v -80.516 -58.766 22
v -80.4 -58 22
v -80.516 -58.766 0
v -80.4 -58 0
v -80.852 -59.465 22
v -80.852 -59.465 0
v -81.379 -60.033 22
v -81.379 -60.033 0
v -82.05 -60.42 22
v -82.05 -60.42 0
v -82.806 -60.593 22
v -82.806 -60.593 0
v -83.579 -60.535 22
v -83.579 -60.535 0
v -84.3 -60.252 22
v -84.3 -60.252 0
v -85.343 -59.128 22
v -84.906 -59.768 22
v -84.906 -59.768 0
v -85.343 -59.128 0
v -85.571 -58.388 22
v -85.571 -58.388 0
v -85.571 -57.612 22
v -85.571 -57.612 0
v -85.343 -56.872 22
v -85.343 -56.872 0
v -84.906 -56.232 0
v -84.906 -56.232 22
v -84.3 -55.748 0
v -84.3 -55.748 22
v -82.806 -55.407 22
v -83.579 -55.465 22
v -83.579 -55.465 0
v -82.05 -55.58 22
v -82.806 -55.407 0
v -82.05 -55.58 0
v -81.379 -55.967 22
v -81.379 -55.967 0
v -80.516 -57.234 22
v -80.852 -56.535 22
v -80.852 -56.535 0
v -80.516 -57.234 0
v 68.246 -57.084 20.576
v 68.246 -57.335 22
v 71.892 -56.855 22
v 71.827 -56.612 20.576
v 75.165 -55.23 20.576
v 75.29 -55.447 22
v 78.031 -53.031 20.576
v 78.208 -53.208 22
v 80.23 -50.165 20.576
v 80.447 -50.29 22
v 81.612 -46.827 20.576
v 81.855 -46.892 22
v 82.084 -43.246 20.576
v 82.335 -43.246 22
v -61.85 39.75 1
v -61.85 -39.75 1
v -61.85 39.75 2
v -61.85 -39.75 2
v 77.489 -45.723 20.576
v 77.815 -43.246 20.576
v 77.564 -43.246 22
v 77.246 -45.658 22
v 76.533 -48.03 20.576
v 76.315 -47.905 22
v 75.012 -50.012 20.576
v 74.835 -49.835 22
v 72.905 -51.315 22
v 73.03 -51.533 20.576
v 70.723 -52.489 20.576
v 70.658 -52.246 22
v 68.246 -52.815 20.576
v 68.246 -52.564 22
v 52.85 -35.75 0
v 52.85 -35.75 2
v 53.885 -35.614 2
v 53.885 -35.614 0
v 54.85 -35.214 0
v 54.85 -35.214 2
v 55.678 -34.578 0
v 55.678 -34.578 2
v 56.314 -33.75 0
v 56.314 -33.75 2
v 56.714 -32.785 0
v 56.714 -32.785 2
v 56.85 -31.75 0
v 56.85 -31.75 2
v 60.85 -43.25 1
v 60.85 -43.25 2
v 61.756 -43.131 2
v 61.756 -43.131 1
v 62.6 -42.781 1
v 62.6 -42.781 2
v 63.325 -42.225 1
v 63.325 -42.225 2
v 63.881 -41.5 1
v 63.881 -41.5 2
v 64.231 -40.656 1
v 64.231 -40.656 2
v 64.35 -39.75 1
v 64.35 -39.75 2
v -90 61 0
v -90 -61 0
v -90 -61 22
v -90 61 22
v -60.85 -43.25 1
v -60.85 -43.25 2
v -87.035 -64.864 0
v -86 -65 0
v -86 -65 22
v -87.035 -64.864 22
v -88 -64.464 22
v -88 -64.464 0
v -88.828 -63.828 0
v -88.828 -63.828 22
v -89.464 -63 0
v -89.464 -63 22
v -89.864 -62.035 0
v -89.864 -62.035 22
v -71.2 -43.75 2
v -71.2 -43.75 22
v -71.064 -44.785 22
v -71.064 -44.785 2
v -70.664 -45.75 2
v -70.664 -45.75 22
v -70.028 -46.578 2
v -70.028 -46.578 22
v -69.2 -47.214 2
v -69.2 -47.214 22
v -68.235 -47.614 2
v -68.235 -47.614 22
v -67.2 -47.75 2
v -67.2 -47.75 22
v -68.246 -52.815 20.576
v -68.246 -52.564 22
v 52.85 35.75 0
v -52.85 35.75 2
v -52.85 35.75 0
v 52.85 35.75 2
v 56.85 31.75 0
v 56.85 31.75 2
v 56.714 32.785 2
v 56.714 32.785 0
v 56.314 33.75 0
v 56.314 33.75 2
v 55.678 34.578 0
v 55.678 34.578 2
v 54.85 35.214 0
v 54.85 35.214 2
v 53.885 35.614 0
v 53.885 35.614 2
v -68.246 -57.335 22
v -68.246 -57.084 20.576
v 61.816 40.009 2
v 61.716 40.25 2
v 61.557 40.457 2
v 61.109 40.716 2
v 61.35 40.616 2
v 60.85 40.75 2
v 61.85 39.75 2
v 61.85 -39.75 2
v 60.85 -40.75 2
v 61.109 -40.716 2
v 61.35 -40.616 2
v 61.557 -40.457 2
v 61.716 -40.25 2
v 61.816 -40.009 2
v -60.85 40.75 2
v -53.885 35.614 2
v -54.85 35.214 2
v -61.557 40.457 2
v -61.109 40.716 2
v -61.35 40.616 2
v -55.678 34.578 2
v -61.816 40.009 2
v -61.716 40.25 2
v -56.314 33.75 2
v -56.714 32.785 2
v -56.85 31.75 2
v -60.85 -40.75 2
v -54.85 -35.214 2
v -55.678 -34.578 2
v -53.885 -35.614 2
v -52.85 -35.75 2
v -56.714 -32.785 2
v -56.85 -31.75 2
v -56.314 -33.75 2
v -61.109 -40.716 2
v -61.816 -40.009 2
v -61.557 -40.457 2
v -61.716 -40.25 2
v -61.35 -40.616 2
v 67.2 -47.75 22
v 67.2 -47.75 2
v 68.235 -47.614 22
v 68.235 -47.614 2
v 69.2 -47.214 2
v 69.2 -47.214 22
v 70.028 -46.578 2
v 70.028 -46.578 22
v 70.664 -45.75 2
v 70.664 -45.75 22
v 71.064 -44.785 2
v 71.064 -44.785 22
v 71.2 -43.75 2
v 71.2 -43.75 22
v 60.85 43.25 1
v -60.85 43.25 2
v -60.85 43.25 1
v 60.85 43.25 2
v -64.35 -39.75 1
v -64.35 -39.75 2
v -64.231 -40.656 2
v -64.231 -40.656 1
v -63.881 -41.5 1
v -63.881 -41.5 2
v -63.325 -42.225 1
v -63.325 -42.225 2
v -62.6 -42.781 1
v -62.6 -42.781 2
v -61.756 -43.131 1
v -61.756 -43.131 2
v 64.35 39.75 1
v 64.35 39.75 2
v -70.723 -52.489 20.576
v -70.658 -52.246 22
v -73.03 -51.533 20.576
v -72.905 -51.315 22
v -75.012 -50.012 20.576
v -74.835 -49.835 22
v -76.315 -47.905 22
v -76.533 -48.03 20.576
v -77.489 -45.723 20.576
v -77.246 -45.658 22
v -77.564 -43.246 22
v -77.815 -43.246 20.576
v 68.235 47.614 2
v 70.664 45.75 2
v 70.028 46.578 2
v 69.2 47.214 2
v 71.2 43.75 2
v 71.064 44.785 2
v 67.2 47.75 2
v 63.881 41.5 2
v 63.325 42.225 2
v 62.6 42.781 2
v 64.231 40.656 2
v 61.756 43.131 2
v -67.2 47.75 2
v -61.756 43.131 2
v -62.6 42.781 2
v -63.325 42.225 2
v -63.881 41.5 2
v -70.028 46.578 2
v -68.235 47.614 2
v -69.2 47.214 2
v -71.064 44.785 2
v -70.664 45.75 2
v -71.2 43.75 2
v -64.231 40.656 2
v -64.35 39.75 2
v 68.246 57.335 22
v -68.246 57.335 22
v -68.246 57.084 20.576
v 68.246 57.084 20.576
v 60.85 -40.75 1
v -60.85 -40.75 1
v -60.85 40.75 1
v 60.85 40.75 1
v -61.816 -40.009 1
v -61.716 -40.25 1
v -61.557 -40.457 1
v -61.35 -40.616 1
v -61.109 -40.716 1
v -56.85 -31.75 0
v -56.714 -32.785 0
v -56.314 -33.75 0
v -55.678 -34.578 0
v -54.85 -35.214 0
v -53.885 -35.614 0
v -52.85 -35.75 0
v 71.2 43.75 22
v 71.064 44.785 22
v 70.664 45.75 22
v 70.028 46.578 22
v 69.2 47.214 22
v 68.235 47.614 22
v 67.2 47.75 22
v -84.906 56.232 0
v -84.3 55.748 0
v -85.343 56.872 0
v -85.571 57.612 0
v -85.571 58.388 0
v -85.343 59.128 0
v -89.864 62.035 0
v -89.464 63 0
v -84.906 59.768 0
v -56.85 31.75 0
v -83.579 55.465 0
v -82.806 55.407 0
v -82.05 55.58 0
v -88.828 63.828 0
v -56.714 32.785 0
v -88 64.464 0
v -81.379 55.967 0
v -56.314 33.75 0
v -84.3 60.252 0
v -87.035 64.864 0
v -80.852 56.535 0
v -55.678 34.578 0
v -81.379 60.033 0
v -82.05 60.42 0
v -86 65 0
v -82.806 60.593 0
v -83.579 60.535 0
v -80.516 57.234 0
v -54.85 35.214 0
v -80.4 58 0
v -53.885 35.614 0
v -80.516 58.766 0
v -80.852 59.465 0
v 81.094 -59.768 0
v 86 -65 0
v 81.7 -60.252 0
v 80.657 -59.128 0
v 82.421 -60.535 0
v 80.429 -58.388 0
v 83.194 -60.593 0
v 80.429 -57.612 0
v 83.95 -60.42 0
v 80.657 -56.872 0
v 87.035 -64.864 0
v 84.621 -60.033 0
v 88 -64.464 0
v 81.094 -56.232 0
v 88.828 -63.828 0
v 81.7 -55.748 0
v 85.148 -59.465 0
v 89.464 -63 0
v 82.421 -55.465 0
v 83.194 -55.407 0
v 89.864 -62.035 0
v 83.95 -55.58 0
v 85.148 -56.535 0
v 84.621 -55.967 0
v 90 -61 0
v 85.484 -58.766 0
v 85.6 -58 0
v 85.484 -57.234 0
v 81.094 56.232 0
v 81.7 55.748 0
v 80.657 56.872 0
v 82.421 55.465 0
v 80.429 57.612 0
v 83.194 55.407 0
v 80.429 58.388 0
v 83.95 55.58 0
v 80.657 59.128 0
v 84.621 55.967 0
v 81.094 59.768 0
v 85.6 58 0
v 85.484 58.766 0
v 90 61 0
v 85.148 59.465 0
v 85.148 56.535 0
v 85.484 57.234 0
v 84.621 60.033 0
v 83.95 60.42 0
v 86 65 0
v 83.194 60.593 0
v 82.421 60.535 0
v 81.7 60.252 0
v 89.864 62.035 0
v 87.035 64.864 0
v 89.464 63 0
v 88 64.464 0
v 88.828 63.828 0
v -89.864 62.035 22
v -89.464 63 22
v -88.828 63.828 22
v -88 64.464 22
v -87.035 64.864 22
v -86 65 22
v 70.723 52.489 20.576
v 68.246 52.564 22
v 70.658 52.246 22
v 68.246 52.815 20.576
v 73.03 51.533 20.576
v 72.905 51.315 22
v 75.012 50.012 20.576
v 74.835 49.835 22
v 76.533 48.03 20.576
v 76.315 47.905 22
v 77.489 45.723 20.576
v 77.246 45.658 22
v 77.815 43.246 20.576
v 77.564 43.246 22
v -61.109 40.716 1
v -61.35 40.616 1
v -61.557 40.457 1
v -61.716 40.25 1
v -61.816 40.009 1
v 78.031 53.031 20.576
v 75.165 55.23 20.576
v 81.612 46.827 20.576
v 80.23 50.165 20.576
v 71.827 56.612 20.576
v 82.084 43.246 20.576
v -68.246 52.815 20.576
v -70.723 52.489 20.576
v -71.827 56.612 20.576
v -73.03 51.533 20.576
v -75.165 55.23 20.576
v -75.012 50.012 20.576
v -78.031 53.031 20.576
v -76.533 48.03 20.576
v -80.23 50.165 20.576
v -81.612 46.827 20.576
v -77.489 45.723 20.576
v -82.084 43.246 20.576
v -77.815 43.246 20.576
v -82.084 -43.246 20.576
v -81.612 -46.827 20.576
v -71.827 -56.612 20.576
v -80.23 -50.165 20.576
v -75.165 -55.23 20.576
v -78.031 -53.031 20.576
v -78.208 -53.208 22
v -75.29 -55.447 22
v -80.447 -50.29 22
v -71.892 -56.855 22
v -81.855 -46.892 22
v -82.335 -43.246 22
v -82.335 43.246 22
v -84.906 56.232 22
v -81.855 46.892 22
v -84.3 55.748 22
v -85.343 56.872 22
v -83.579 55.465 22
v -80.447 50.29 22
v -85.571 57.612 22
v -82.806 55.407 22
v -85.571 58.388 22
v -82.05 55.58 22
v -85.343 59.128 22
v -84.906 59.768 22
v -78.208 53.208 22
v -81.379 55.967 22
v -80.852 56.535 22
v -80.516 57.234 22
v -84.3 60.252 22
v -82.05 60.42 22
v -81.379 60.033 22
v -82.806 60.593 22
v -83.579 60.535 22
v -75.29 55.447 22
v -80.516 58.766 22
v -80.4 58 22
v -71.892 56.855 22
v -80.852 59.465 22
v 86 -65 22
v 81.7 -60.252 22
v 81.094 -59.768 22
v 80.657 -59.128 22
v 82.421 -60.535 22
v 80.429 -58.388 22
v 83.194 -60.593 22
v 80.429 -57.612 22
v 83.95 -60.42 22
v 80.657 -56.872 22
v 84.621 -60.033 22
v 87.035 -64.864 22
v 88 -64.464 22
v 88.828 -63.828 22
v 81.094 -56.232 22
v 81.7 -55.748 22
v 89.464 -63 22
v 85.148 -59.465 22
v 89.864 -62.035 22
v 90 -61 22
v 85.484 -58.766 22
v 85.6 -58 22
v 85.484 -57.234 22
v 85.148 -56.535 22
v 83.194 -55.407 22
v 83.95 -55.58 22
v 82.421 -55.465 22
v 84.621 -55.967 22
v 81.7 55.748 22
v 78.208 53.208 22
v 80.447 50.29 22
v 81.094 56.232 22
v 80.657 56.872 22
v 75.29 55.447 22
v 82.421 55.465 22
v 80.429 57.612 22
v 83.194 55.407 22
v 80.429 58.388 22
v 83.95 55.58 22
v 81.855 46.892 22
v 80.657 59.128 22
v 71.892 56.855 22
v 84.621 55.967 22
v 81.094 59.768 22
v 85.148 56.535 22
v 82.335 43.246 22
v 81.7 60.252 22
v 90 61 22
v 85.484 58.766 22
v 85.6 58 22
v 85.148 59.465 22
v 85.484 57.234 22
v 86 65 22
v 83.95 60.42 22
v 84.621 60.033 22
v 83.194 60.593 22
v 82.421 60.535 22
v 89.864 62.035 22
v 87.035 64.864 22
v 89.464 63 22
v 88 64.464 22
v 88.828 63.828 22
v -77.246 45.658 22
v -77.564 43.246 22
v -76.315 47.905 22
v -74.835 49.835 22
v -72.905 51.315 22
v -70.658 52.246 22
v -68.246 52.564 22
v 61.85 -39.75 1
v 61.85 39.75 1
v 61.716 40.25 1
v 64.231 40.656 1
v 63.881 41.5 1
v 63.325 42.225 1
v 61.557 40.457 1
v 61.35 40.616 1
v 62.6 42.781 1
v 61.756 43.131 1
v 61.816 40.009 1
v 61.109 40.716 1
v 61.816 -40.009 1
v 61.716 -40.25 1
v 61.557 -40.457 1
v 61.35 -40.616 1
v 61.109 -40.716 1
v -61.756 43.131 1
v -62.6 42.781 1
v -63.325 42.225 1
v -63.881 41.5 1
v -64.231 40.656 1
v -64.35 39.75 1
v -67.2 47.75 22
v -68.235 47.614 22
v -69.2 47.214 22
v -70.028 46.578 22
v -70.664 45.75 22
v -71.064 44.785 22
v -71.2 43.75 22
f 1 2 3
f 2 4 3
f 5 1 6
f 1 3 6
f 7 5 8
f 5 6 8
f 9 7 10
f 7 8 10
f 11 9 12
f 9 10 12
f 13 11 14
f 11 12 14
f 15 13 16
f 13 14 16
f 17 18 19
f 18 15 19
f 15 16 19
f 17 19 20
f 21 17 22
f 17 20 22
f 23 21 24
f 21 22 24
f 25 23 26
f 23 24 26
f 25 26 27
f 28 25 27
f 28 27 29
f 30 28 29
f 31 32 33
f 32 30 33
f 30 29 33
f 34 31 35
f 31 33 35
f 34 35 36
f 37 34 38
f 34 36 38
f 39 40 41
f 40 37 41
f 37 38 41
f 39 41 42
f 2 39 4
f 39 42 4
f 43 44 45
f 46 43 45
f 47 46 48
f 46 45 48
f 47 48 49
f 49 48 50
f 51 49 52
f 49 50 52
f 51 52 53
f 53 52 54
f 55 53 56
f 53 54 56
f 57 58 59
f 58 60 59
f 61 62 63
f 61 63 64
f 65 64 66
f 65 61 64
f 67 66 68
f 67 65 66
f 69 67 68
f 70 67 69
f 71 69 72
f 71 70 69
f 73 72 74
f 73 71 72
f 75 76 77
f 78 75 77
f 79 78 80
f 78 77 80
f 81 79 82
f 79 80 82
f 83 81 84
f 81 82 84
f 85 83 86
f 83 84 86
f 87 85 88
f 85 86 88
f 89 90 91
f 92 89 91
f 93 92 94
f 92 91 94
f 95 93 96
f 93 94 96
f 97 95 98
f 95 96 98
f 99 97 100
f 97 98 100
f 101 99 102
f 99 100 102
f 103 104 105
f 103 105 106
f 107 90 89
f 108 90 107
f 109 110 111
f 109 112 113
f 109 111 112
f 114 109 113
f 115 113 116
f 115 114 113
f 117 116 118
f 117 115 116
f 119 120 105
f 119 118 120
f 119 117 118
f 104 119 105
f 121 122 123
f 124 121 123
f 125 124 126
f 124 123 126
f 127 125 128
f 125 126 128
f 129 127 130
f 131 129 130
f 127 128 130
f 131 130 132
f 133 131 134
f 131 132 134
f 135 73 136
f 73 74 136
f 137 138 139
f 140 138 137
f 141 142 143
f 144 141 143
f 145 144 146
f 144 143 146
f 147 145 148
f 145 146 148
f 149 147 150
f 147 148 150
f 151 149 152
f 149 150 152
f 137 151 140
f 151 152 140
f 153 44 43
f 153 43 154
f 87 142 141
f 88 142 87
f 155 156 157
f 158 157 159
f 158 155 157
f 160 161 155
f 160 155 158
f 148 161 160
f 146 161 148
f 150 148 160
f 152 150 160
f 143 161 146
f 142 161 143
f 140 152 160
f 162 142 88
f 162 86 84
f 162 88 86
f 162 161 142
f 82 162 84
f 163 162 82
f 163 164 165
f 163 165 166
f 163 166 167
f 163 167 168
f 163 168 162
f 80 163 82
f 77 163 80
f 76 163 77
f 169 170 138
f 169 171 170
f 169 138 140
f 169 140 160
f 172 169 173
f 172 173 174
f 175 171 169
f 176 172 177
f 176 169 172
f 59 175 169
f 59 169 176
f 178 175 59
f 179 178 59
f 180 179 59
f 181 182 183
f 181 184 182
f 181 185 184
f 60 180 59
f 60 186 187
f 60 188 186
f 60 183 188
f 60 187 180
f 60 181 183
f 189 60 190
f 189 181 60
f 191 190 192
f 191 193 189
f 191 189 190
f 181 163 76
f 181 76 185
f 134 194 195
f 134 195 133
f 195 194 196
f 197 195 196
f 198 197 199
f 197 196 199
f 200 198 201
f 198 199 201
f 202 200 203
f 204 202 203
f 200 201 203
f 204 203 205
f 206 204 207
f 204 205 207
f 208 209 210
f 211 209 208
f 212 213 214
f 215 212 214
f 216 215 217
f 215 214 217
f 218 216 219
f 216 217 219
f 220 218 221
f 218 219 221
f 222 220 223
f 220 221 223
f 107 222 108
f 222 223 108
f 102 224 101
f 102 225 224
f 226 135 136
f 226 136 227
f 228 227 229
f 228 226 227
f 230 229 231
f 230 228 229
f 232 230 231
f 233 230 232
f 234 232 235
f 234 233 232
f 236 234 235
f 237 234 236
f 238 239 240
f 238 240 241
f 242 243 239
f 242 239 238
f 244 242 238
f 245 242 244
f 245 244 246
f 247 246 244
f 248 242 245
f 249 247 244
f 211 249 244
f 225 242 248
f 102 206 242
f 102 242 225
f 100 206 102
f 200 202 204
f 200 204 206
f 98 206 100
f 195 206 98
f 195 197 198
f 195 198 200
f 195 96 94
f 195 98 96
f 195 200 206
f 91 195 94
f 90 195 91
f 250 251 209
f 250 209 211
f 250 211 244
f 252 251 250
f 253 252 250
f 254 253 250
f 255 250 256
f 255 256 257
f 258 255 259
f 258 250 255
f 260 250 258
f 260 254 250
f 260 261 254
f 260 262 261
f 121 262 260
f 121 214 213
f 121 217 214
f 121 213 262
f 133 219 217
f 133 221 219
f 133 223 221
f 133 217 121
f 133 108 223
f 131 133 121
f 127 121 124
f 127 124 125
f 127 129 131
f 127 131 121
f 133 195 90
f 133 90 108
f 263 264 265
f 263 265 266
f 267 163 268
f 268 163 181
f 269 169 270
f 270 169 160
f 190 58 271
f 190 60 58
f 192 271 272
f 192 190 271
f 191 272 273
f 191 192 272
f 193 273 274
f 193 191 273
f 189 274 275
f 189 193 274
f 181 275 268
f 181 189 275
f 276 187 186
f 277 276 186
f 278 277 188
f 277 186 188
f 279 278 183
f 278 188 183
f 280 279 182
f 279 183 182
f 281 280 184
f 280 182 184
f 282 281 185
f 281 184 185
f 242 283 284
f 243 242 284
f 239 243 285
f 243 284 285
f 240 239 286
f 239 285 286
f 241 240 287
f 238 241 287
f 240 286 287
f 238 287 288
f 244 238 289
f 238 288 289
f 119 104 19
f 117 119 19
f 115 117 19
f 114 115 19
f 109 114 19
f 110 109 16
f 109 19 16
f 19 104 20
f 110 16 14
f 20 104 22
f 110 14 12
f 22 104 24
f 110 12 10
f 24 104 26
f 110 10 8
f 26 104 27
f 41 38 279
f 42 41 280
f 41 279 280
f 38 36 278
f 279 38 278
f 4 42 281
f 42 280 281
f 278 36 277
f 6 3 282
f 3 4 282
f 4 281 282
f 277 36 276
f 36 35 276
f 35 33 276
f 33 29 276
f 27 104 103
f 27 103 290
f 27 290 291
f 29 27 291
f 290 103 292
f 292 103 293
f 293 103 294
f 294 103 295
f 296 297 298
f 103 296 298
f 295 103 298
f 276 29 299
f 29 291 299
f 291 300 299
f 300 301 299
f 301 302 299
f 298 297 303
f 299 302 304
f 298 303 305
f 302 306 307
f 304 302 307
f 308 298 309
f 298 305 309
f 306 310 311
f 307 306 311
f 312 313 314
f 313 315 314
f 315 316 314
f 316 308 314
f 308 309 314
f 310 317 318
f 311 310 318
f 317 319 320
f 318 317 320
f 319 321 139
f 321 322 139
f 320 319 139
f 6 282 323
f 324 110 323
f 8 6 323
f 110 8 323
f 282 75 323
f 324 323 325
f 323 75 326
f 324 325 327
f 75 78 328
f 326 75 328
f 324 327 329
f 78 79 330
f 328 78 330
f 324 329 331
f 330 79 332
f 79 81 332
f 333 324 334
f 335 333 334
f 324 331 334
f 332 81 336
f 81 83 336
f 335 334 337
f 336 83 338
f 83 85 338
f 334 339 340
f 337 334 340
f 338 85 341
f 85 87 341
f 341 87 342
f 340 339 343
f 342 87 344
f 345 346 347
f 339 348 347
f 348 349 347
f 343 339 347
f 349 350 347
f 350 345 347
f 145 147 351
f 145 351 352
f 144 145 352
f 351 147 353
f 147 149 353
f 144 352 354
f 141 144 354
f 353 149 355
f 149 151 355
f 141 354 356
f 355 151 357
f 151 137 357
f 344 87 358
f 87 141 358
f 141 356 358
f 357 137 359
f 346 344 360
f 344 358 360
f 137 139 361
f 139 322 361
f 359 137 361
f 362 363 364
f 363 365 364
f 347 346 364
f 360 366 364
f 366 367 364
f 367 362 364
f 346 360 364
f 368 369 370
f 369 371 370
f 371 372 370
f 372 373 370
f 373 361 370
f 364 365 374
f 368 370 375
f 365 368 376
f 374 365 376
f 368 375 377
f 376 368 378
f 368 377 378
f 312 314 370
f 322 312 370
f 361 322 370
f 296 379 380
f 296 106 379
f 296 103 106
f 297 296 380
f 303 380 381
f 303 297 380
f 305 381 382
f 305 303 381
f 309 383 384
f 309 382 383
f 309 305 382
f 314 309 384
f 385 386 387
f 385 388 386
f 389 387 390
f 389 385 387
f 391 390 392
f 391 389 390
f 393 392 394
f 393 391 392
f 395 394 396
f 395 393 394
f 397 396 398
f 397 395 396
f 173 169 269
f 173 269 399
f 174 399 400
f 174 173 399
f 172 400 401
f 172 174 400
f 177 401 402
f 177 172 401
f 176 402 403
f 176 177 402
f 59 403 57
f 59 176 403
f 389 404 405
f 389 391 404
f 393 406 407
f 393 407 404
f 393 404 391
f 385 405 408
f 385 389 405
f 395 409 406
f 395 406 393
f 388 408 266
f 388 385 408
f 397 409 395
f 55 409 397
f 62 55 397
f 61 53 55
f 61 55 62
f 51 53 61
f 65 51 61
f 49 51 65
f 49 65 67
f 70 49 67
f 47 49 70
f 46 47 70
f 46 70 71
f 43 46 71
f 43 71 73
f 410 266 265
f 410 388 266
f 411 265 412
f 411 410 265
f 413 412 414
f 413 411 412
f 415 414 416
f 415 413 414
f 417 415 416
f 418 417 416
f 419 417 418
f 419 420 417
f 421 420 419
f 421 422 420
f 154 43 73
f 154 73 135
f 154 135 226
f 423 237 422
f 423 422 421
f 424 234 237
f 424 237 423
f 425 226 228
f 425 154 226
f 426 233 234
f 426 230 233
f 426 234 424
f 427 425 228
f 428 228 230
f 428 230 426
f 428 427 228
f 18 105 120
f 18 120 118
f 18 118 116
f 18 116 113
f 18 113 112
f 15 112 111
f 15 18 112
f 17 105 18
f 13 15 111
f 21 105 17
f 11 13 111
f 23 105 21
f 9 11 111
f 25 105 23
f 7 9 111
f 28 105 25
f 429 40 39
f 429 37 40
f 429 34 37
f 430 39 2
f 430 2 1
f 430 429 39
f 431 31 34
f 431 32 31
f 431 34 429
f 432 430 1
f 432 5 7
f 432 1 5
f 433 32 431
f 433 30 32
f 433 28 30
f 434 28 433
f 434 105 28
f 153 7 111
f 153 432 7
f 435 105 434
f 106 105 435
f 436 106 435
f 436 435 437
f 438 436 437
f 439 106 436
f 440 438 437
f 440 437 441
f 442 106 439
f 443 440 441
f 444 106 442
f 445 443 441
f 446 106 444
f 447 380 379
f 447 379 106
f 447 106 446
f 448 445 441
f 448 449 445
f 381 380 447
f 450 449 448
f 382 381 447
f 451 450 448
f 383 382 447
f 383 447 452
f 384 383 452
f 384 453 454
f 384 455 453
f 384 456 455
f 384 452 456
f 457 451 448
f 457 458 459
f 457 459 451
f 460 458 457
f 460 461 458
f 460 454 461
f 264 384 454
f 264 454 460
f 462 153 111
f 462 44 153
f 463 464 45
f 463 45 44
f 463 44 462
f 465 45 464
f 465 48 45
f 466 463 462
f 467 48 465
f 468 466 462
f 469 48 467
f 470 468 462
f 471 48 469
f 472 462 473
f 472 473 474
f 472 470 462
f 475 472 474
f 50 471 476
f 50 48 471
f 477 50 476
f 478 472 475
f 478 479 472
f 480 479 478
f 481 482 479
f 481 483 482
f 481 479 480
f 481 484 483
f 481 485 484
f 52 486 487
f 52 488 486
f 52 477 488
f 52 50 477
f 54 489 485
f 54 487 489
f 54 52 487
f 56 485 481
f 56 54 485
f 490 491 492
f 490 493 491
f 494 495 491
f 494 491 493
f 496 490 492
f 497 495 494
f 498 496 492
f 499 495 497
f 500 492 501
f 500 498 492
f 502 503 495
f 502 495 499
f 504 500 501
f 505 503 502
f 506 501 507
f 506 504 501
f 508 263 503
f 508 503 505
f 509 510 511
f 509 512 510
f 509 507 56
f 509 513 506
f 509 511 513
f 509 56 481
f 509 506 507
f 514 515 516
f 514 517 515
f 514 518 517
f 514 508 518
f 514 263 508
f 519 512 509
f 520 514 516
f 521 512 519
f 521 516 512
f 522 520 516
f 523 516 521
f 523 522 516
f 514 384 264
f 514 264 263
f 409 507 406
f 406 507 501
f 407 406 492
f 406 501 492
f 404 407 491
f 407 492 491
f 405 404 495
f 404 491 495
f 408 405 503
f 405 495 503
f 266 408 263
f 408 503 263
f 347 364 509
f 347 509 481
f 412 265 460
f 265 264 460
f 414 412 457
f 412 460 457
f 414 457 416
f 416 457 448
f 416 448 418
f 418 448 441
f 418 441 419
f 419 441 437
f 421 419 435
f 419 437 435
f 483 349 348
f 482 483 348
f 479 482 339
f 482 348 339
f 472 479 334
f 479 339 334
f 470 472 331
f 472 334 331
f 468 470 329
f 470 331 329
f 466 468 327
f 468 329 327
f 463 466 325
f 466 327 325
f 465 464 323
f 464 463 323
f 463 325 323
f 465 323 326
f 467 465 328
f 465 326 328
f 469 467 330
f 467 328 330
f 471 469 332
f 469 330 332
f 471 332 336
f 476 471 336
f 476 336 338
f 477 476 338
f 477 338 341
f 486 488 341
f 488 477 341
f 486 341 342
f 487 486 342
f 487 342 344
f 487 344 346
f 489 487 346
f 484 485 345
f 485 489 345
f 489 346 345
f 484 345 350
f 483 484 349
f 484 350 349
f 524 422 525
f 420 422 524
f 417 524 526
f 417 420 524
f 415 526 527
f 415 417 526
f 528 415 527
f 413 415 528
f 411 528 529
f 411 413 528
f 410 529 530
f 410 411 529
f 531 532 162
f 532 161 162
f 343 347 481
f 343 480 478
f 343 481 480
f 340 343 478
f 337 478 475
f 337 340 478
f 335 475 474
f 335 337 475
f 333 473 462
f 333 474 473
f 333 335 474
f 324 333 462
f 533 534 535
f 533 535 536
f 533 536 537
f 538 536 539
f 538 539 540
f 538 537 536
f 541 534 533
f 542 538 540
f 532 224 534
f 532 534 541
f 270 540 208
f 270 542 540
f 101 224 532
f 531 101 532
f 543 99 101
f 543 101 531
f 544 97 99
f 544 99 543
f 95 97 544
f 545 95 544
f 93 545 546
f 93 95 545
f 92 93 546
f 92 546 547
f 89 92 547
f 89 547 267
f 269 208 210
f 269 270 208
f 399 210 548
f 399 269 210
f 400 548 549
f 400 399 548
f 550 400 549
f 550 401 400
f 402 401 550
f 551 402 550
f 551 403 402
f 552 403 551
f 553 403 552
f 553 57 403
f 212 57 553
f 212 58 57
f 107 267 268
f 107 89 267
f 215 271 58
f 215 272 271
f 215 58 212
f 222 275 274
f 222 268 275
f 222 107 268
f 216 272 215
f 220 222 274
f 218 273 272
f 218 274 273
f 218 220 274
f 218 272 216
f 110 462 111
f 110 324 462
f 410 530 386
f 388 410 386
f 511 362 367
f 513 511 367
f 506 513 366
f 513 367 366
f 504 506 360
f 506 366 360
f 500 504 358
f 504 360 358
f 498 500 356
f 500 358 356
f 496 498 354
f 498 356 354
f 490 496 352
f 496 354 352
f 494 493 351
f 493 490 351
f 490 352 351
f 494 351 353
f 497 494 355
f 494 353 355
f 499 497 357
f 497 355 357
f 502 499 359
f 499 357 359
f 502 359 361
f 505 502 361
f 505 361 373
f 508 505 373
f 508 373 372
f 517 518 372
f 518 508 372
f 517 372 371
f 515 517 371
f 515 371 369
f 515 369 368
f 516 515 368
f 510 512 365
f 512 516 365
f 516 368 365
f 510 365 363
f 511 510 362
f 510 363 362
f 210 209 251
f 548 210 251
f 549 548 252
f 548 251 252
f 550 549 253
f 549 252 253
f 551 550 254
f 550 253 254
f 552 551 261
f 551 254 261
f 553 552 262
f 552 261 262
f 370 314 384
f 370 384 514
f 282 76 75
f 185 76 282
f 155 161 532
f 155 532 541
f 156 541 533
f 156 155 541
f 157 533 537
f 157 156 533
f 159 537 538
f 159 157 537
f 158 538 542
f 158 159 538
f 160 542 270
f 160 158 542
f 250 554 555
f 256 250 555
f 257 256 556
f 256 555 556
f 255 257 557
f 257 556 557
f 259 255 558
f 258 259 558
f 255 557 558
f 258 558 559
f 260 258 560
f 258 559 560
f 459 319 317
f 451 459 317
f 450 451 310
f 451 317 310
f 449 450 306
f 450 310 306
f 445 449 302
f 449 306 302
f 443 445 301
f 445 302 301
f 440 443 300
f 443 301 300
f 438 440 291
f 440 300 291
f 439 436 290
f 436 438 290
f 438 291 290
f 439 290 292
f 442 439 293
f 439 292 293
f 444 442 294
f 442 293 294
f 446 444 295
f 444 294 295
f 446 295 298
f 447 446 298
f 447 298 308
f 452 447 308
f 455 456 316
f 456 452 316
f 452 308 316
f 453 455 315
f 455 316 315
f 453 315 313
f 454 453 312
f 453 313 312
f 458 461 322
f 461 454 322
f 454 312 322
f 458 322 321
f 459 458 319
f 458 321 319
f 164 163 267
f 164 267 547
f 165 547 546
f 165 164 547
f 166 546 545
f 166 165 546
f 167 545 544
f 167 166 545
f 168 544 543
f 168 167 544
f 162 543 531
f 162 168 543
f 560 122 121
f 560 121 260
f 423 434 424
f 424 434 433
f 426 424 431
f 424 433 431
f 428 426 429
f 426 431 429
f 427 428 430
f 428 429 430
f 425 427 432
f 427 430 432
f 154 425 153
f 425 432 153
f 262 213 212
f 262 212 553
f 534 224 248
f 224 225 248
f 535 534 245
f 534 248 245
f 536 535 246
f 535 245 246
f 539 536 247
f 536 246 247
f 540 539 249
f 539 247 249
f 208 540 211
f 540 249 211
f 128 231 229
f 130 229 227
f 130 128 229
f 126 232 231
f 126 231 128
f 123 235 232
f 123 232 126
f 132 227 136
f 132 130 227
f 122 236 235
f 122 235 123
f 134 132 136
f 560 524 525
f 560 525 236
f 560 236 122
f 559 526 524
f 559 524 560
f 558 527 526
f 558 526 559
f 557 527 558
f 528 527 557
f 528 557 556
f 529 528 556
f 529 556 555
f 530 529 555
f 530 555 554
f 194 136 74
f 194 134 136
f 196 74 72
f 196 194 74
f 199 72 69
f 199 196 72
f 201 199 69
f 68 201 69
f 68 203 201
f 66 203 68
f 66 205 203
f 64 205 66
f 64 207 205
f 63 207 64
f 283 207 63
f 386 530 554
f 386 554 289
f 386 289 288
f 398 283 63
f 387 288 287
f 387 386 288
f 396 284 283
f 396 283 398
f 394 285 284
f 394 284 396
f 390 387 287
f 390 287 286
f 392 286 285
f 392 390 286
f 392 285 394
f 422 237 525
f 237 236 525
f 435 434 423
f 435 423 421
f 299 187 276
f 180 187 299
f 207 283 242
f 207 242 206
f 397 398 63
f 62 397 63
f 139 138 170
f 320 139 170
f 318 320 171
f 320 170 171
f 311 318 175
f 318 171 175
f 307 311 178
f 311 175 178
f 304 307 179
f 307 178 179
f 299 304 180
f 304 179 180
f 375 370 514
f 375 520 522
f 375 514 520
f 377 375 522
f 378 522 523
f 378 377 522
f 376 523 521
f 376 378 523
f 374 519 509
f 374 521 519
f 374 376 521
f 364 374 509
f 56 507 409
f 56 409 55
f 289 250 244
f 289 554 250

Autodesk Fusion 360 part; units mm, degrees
sketch "Sketch1" plane through (0, 0, 0) normal (0, 0, 1) x (1, 0, 0)
  line L0 (86, -65) -> (-86, -65)
  line L1 (-90, -61) -> (-90, 61)
  line L2 (-86, 65) -> (86, 65)
  line L3 (90, 61) -> (90, -61)
  line L4 (90, -65) -> (-90, 65) construction
  line L5 (-90, -65) -> (90, 65) construction
  arc A0 (-86, 65) -> (-90, 61) centre (-86, 61) ccw
  arc A1 (90, 61) -> (86, 65) centre (86, 61) ccw
  arc A2 (86, -65) -> (90, -61) centre (86, -61) ccw
  arc A3 (-90, -61) -> (-86, -65) centre (-86, -61) ccw
  circle A4 centre (-83, 58) radius 2.6
  line L6 (0, 65) -> (0, -65) construction
  line L7 (90, 0) -> (-90, 0) construction
  circle A5 centre (83, 58) radius 2.6
  circle A6 centre (83, -58) radius 2.6
  circle A7 centre (-83, -58) radius 2.6
  dimension "d1" = 180
  dimension "d2" = 130
  dimension "d26" = 4
  dimension "d27" = 4
  dimension "d28" = 4
  dimension "d29" = 4
  dimension "d30" = 5.2
  dimension "d31" = 7
  dimension "d32" = 7
extrude "Extrude1" add sketch "Sketch1" along normal blind 22
sketch "Sketch2" plane through (0, 0, 22) normal (0, 0, 1) x (-1, 0, 0)
  line L0 (-86, -65) -> (86, -65)
  line L1 (90, -61) -> (90, 61)
  line L2 (86, 65) -> (-86, 65)
  line L3 (-90, 61) -> (-90, -61)
  line L4 (-67.2, 47.75) -> (67.2, 47.75)
  line L5 (71.2, 43.75) -> (71.2, -43.75)
  line L6 (67.2, -47.75) -> (-67.2, -47.75)
  line L7 (-71.2, -43.75) -> (-71.2, 43.75)
  line L8 (-71.2, 47.75) -> (71.2, -47.75) construction
  line L9 (71.2, 47.75) -> (-71.2, -47.75) construction
  arc A0 (86, -65) -> (90, -61) centre (86, -61) ccw
  arc A1 (90, 61) -> (86, 65) centre (86, 61) ccw
  arc A2 (-86, 65) -> (-90, 61) centre (-86, 61) ccw
  arc A3 (-90, -61) -> (-86, -65) centre (-86, -61) ccw
  circle A4 centre (83, 58) radius 2.6
  circle A5 centre (-83, 58) radius 2.6
  circle A6 centre (-83, -58) radius 2.6
  circle A7 centre (83, -58) radius 2.6
  arc A8 (67.2, -47.75) -> (71.2, -43.75) centre (67.2, -43.75) ccw
  arc A9 (-71.2, -43.75) -> (-67.2, -47.75) centre (-67.2, -43.75) ccw
  arc A10 (71.2, 43.75) -> (67.2, 47.75) centre (67.2, 43.75) ccw
  arc A11 (-67.2, 47.75) -> (-71.2, 43.75) centre (-67.2, 43.75) ccw
  dimension "d5" = 142.4
  dimension "d6" = 95.5
  dimension "d52" = 4
  dimension "d53" = 4
  dimension "d54" = 4
  dimension "d55" = 4
extrude "Extrude2" cut sketch "Sketch2" against normal blind 20 contours L4 L5 L6 L7 A8 A9 A10 A11
sketch "Sketch3" plane through (0, 0, 22) normal (0, 0, 1) x (-1, 0, 0)
  line L0 (71.2, 43.75) -> (71.2, -43.75)
  line L1 (67.2, -47.75) -> (-67.2, -47.75)
  line L2 (-71.2, -43.75) -> (-71.2, 43.75)
  line L3 (-67.2, 47.75) -> (67.2, 47.75)
  line L4 (-86, -65) -> (86, -65)
  line L5 (90, -61) -> (90, 61)
  line L6 (86, 65) -> (-86, 65)
  line L7 (-90, 61) -> (-90, -61)
  line L8 (-79.9494, 54.9494) -> (79.9494, 54.9494) construction
  line L9 (79.9494, 54.9494) -> (79.9494, -54.9494) construction
  line L10 (79.9494, -54.9494) -> (-79.9494, -54.9494) construction
  line L11 (-79.9494, -54.9494) -> (-79.9494, 54.9494) construction
  line L12 (-79.9494, 54.9494) -> (79.9494, -54.9494) construction
  line L13 (79.9494, 54.9494) -> (-79.9494, -54.9494) construction
  line L14 (77.8149, 43.2459) -> (77.8149, -43.2459)
  line L15 (68.2459, -52.8149) -> (-68.2459, -52.8149)
  line L16 (-77.8149, -43.2459) -> (-77.8149, 43.2459)
  line L17 (-69.6267, 47.2574) -> (77.8149, -52.8149) construction
  line L18 (70.6619, 45.6619) -> (-70.6619, -45.6619) construction
  line L19 (-68.2459, 57.0839) -> (68.2459, 57.0839)
  line L20 (82.0839, 43.2459) -> (82.0839, -43.2459)
  line L21 (68.2459, -57.0839) -> (-68.2459, -57.0839)
  line L22 (-82.0839, -43.2459) -> (-82.0839, 43.2459)
  line L23 (-72.3401, 50.3077) -> (82.0839, -57.0839) construction
  line L24 (73.5309, 48.5309) -> (-73.5309, -48.5309) construction
  arc A0 (68.2459, -52.8149) -> (77.8149, -43.2459) centre (68.2459, -43.2459) ccw
  arc A1 (68.2459, -57.0839) -> (82.0839, -43.2459) centre (68.2459, -43.2459) ccw
  line L25 (0, -65) -> (0, 65) construction
  line L26 (-90, 0) -> (90, 0) construction
  arc A2 (-77.8149, -43.2459) -> (-68.2459, -52.8149) centre (-68.2459, -43.2459) ccw
  arc A3 (-82.0839, -43.2459) -> (-68.2459, -57.0839) centre (-68.2459, -43.2459) ccw
  arc A4 (-68.2459, 52.8149) -> (-77.8149, 43.2459) centre (-68.2459, 43.2459) ccw
  arc A5 (-68.2459, 57.0839) -> (-82.0839, 43.2459) centre (-68.2459, 43.2459) ccw
  arc A6 (77.8149, 43.2459) -> (68.2459, 52.8149) centre (68.2459, 43.2459) ccw
  arc A7 (82.0839, 43.2459) -> (68.2459, 57.0839) centre (68.2459, 43.2459) ccw
  line L27 (-68.2459, 52.8149) -> (68.2459, 52.8149)
  arc A8 (86, -65) -> (90, -61) centre (86, -61) ccw
  arc A9 (90, 61) -> (86, 65) centre (86, 61) ccw
  arc A10 (-86, 65) -> (-90, 61) centre (-86, 61) ccw
  arc A11 (-90, -61) -> (-86, -65) centre (-86, -61) ccw
  circle A12 centre (83, 58) radius 2.6
  circle A13 centre (-83, 58) radius 2.6
  circle A14 centre (-83, -58) radius 2.6
  circle A15 centre (83, -58) radius 2.6
  arc A16 (71.2, 43.75) -> (67.2, 47.75) centre (67.2, 43.75) ccw
  arc A17 (67.2, -47.75) -> (71.2, -43.75) centre (67.2, -43.75) ccw
  arc A18 (-71.2, -43.75) -> (-67.2, -47.75) centre (-67.2, -43.75) ccw
  arc A19 (-67.2, 47.75) -> (-71.2, 43.75) centre (-67.2, 43.75) ccw
  dimension "d9" = 159.8988
  dimension "d15" = 109.8988
  dimension "d16" = 2.1345
  dimension "d17" = 2.1345
  dimension "d18" = 2.1345
  dimension "d19" = 2.1345
  dimension "d20" = 9.569
  dimension "d21" = 13.838
extrude "Extrude3" cut sketch "Sketch3" against normal blind 1.424 contours L19 L20 L21 L22 A1 A3 A5 A7
draft "Draft1" angle 10 neutral plane through (0, 0, 20.576) pull (0, 0, 1) 16 faces at (-77.8149, -14.4153, 21.5253) (-71.8024, 52.1295, 21.0507) (-22.7486, 52.8149, 21.5253) (72.6307, 51.7512, 21.0507) (77.8149, 14.4153, 21.5253) (73.0304, -51.5329, 21.0507) (22.7486, -52.8149, 21.5253) (-77.1295, -46.8024, 21.0507) (-82.0839, -14.4153, 21.5253) (-76.2727, -54.518, 21.0507) (-22.7486, -57.0839, 21.0507) (82.0213, -44.5613, 21.0507) (82.0839, 14.4153, 21.5253) (77.7952, 53.2609, 21.0507) (22.7486, 57.0839, 21.0507) (-76.8, 54.1233, 21.0507)
sketch "Sketch6" plane through (0, 0, 2) normal (0, 0, 1) x (-1, 0, 0)
  arc A0 (71.2, 43.75) -> (67.2, 47.75) centre (67.2, 43.75) ccw
  line L0 (67.2, 47.75) -> (-67.2, 47.75)
  arc A1 (-67.2, 47.75) -> (-71.2, 43.75) centre (-67.2, 43.75) ccw
  line L1 (-71.2, 43.75) -> (-71.2, -43.75)
  arc A2 (-71.2, -43.75) -> (-67.2, -47.75) centre (-67.2, -43.75) ccw
  line L2 (-67.2, -47.75) -> (67.2, -47.75)
  arc A3 (67.2, -47.75) -> (71.2, -43.75) centre (67.2, -43.75) ccw
  line L3 (71.2, -43.75) -> (71.2, 43.75)
  arc A4 (60.9079, -41.3399) -> (62.4799, -39.7679) centre (60.9079, -39.7679) ccw construction
  arc A5 (-62.4799, -39.7399) -> (-60.9079, -41.3119) centre (-60.9079, -39.7399) ccw construction
  line L4 (-48.9575, -41.8399) -> (48.9575, -41.8399) construction
  line L5 (48.9575, 41.8399) -> (-48.9575, 41.8399) construction
  line L6 (-62.9799, 29.7119) -> (-62.9799, 27.8175) construction
  line L7 (48.9575, -41.8399) -> (50.8519, -41.8399) construction
  line L8 (62.4799, 30.3078) -> (62.4799, 39.7679) construction
  arc A6 (-60.88, 42.74) -> (-63.88, 39.74) centre (-60.88, 39.74) ccw construction
  line L9 (63.88, 39.74) -> (63.88, -39.74) construction
  arc A7 (63.88, 39.74) -> (60.88, 42.74) centre (60.88, 39.74) ccw construction
  line L10 (-62.9799, -29.7119) -> (-62.4799, -30.3078) construction
  line L11 (51.4478, 41.3399) -> (50.8519, 41.8399) construction
  arc A8 (60.88, -42.74) -> (63.88, -39.74) centre (60.88, -39.74) ccw construction
  line L12 (-48.9575, 41.8399) -> (-50.8519, 41.8399) construction
  line L13 (-60.88, 42.74) -> (60.88, 42.74) construction
  line L14 (-62.9799, -27.8175) -> (-62.9799, -29.7119) construction
  line L15 (60.88, -42.74) -> (-60.88, -42.74) construction
  line L16 (62.9799, 29.7119) -> (62.4799, 30.3078) construction
  line L17 (-50.8519, 41.8399) -> (-51.4811, 41.3119) construction
  line L18 (62.4799, -39.7679) -> (62.4799, -30.3078) construction
  line L19 (-50.8519, -41.8399) -> (-48.9575, -41.8399) construction
  line L20 (60.9079, 41.3399) -> (51.4478, 41.3399) construction
  line L21 (50.8519, 41.8399) -> (48.9575, 41.8399) construction
  line L22 (62.9799, 27.8175) -> (62.9799, 29.7119) construction
  line L23 (51.4478, -41.3399) -> (60.9079, -41.3399) construction
  line L24 (62.9799, -27.8175) -> (62.9799, 27.8175) construction
  line L25 (-63.88, -39.74) -> (-63.88, 39.74) construction
  line L26 (50.8519, -41.8399) -> (51.4478, -41.3399) construction
  line L27 (62.9799, -29.7119) -> (62.9799, -27.8175) construction
  arc A9 (-63.88, -39.74) -> (-60.88, -42.74) centre (-60.88, -39.74) ccw construction
  arc A10 (62.4799, 39.7679) -> (60.9079, 41.3399) centre (60.9079, 39.7679) ccw construction
  line L28 (62.4799, -30.3078) -> (62.9799, -29.7119) construction
  line L29 (-62.4799, 30.3078) -> (-62.9799, 29.7119) construction
  line L30 (-60.9079, -41.3119) -> (-51.4811, -41.3119) construction
  arc A11 (-60.9079, 41.3119) -> (-62.4799, 39.7399) centre (-60.9079, 39.7399) ccw construction
  line L31 (-51.4811, -41.3119) -> (-50.8519, -41.8399) construction
  line L32 (-51.4811, 41.3119) -> (-60.9079, 41.3119) construction
  line L33 (-62.4799, 39.7399) -> (-62.4799, 30.3078) construction
  line L34 (-62.4799, -30.3078) -> (-62.4799, -39.7399) construction
  line L35 (-62.9799, 27.8175) -> (-62.9799, -27.8175) construction
  line L36 (0, -47.75) -> (0, 47.75) construction
  line L37 (-71.2, 0) -> (71.2, 0) construction
  line L38 (-60.85, 43.25) -> (60.85, 43.25)
  line L39 (64.35, 39.75) -> (64.35, -39.75)
  line L40 (60.85, -43.25) -> (-60.85, -43.25)
  line L41 (-64.35, -39.75) -> (-64.35, 39.75)
  line L42 (-64.35, 43.25) -> (64.35, -43.25) construction
  line L43 (64.35, 43.25) -> (-64.35, -43.25) construction
  arc A12 (60.85, -43.25) -> (64.35, -39.75) centre (60.85, -39.75) ccw
  arc A13 (-64.35, -39.75) -> (-60.85, -43.25) centre (-60.85, -39.75) ccw
  arc A14 (-60.85, 43.25) -> (-64.35, 39.75) centre (-60.85, 39.75) ccw
  arc A15 (64.35, 39.75) -> (60.85, 43.25) centre (60.85, 39.75) ccw
  line L44 (-60.85, 40.75) -> (60.85, 40.75)
  line L45 (61.85, 39.75) -> (61.85, -39.75)
  line L46 (60.85, -40.75) -> (-60.85, -40.75)
  line L47 (-61.85, -39.75) -> (-61.85, 39.75)
  line L48 (-61.85, 40.75) -> (61.85, -40.75) construction
  line L49 (61.85, 40.75) -> (-61.85, -40.75) construction
  arc A16 (-61.85, -39.75) -> (-60.85, -40.75) centre (-60.85, -39.75) ccw
  arc A17 (60.85, -40.75) -> (61.85, -39.75) centre (60.85, -39.75) ccw
  arc A18 (61.85, 39.75) -> (60.85, 40.75) centre (60.85, 39.75) ccw
  arc A19 (-60.85, 40.75) -> (-61.85, 39.75) centre (-60.85, 39.75) ccw
  dimension "d56" = 128.7
  dimension "d57" = 86.5
  dimension "d58" = 3.5
  dimension "d59" = 3.5
  dimension "d60" = 3.5
  dimension "d61" = 3.5
  dimension "d63" = 2.5
  dimension "d64" = 2.5
  dimension "d65" = 1
  dimension "d66" = 1
  dimension "d67" = 1
  dimension "d68" = 1
extrude "Extrude7" cut sketch "Sketch6" against normal blind 1 contours L38 L39 L40 L41 A12 A13 A14 A15
sketch "Sketch4" plane through (0, 0, 2) normal (0, 0, 1) x (-1, 0, 0)
  line L0 (-67.2, -47.75) -> (67.2, -47.75)
  line L1 (71.2, -43.75) -> (71.2, 43.75)
  line L2 (67.2, 47.75) -> (-67.2, 47.75)
  line L3 (-71.2, 43.75) -> (-71.2, -43.75)
  line L4 (-52.85, 35.75) -> (52.85, 35.75)
  line L5 (56.85, 31.75) -> (56.85, -31.75)
  line L6 (52.85, -35.75) -> (-52.85, -35.75)
  line L7 (-56.85, -31.75) -> (-56.85, 31.75)
  line L8 (-56.85, 35.75) -> (56.85, -35.75) construction
  line L9 (56.85, 35.75) -> (-56.85, -35.75) construction
  arc A0 (71.2, 43.75) -> (67.2, 47.75) centre (67.2, 43.75) ccw
  arc A1 (-67.2, 47.75) -> (-71.2, 43.75) centre (-67.2, 43.75) ccw
  arc A2 (-71.2, -43.75) -> (-67.2, -47.75) centre (-67.2, -43.75) ccw
  arc A3 (67.2, -47.75) -> (71.2, -43.75) centre (67.2, -43.75) ccw
  arc A4 (52.85, -35.75) -> (56.85, -31.75) centre (52.85, -31.75) ccw
  arc A5 (-56.85, -31.75) -> (-52.85, -35.75) centre (-52.85, -31.75) ccw
  arc A6 (-52.85, 35.75) -> (-56.85, 31.75) centre (-52.85, 31.75) ccw
  arc A7 (56.85, 31.75) -> (52.85, 35.75) centre (52.85, 31.75) ccw
  line L10 (64.35, 39.75) -> (64.35, -39.75)
  arc A8 (60.85, -43.25) -> (64.35, -39.75) centre (60.85, -39.75) ccw
  line L11 (60.85, -43.25) -> (-60.85, -43.25)
  arc A9 (-64.35, -39.75) -> (-60.85, -43.25) centre (-60.85, -39.75) ccw
  line L12 (-64.35, -39.75) -> (-64.35, 39.75)
  arc A10 (-60.85, 43.25) -> (-64.35, 39.75) centre (-60.85, 39.75) ccw
  line L13 (-60.85, 43.25) -> (60.85, 43.25)
  arc A11 (64.35, 39.75) -> (60.85, 43.25) centre (60.85, 39.75) ccw
  line L14 (61.85, -39.75) -> (61.85, 39.75)
  arc A12 (61.85, 39.75) -> (60.85, 40.75) centre (60.85, 39.75) ccw
  line L15 (60.85, 40.75) -> (-60.85, 40.75)
  arc A13 (-60.85, 40.75) -> (-61.85, 39.75) centre (-60.85, 39.75) ccw
  line L16 (-61.85, 39.75) -> (-61.85, -39.75)
  arc A14 (-61.85, -39.75) -> (-60.85, -40.75) centre (-60.85, -39.75) ccw
  line L17 (-60.85, -40.75) -> (60.85, -40.75)
  arc A15 (60.85, -40.75) -> (61.85, -39.75) centre (60.85, -39.75) ccw
  dimension "d71" = 4
  dimension "d72" = 4
  dimension "d73" = 4
  dimension "d74" = 4
  dimension "d77" = 5
  dimension "d78" = 5
extrude "Extrude8" cut sketch "Sketch4" against normal blind 5 contours L4 L5 L6 L7 A4 A5 A6 A7
equation "d9 = ( ORingPerimeter - 100 mm ) / 4 + 50 mm"
equation "ORingDiameter = 1.78 mm" comment "Diamter of the O ring"
equation "ORingInnerDiameter = 170 mm" comment "Inner diamter of the o ring bore"
equation "ORingPerimeter = 2 * 3.1412 * ( ( ORingInnerDiameter / 2 ) + ORingDiameter / 2 )"
equation "PanelWidth = 80 mm"
equation "PanelLength = 115 mm"
equation "d15 = ( ORingPerimeter - 100 mm ) / 4"
equation "d16 = ( ( ORingDiameter * 1.05 ) / 2 ) + 1.2 mm"
equation "d17 = ( ( ORingDiameter * 1.05 ) / 2 ) + 1.2 mm"
equation "d18 = ( ( ORingDiameter * 1.05 ) / 2 ) + 1.2 mm"
equation "d19 = ( ( ORingDiameter * 1.05 ) / 2 ) + 1.2 mm"
equation "d20 = ( ORingDiameter ) * 6 + ORingDiameter * 0.05 - 1.2 mm"
equation "d21 = ( ORingDiameter ) * 6 + ( ORingDiameter * 1.1 ) + 1.2 mm"
equation "d22 = -ORingDiameter * 0.8"
equation "d30 = Insert_OD - 0.5 mm"
equation "ORing2Diameter = 2 mm" comment "Second O ring Diameter"
equation "ORing2InnerDiameter = 126 mm" comment "Inner diameter of the second O Ring"
equation "ORing2Perimeter = 2 * 3.1412 * ( ( ORing2InnerDiameter / 2 ) + ORing2Diameter / 2 )"
equation "Bolt_Diam = 4 mm" comment "Diameter of the bolt"
equation "Bolt_Head_Height = 4 mm" comment "height of the bolt head"
equation "Bolt_Head_Diam = 7.22 mm" comment "Diameter of the bolt head"
equation "Insert_OD = 5.7 mm" comment "Outer Diameter of the insert"
